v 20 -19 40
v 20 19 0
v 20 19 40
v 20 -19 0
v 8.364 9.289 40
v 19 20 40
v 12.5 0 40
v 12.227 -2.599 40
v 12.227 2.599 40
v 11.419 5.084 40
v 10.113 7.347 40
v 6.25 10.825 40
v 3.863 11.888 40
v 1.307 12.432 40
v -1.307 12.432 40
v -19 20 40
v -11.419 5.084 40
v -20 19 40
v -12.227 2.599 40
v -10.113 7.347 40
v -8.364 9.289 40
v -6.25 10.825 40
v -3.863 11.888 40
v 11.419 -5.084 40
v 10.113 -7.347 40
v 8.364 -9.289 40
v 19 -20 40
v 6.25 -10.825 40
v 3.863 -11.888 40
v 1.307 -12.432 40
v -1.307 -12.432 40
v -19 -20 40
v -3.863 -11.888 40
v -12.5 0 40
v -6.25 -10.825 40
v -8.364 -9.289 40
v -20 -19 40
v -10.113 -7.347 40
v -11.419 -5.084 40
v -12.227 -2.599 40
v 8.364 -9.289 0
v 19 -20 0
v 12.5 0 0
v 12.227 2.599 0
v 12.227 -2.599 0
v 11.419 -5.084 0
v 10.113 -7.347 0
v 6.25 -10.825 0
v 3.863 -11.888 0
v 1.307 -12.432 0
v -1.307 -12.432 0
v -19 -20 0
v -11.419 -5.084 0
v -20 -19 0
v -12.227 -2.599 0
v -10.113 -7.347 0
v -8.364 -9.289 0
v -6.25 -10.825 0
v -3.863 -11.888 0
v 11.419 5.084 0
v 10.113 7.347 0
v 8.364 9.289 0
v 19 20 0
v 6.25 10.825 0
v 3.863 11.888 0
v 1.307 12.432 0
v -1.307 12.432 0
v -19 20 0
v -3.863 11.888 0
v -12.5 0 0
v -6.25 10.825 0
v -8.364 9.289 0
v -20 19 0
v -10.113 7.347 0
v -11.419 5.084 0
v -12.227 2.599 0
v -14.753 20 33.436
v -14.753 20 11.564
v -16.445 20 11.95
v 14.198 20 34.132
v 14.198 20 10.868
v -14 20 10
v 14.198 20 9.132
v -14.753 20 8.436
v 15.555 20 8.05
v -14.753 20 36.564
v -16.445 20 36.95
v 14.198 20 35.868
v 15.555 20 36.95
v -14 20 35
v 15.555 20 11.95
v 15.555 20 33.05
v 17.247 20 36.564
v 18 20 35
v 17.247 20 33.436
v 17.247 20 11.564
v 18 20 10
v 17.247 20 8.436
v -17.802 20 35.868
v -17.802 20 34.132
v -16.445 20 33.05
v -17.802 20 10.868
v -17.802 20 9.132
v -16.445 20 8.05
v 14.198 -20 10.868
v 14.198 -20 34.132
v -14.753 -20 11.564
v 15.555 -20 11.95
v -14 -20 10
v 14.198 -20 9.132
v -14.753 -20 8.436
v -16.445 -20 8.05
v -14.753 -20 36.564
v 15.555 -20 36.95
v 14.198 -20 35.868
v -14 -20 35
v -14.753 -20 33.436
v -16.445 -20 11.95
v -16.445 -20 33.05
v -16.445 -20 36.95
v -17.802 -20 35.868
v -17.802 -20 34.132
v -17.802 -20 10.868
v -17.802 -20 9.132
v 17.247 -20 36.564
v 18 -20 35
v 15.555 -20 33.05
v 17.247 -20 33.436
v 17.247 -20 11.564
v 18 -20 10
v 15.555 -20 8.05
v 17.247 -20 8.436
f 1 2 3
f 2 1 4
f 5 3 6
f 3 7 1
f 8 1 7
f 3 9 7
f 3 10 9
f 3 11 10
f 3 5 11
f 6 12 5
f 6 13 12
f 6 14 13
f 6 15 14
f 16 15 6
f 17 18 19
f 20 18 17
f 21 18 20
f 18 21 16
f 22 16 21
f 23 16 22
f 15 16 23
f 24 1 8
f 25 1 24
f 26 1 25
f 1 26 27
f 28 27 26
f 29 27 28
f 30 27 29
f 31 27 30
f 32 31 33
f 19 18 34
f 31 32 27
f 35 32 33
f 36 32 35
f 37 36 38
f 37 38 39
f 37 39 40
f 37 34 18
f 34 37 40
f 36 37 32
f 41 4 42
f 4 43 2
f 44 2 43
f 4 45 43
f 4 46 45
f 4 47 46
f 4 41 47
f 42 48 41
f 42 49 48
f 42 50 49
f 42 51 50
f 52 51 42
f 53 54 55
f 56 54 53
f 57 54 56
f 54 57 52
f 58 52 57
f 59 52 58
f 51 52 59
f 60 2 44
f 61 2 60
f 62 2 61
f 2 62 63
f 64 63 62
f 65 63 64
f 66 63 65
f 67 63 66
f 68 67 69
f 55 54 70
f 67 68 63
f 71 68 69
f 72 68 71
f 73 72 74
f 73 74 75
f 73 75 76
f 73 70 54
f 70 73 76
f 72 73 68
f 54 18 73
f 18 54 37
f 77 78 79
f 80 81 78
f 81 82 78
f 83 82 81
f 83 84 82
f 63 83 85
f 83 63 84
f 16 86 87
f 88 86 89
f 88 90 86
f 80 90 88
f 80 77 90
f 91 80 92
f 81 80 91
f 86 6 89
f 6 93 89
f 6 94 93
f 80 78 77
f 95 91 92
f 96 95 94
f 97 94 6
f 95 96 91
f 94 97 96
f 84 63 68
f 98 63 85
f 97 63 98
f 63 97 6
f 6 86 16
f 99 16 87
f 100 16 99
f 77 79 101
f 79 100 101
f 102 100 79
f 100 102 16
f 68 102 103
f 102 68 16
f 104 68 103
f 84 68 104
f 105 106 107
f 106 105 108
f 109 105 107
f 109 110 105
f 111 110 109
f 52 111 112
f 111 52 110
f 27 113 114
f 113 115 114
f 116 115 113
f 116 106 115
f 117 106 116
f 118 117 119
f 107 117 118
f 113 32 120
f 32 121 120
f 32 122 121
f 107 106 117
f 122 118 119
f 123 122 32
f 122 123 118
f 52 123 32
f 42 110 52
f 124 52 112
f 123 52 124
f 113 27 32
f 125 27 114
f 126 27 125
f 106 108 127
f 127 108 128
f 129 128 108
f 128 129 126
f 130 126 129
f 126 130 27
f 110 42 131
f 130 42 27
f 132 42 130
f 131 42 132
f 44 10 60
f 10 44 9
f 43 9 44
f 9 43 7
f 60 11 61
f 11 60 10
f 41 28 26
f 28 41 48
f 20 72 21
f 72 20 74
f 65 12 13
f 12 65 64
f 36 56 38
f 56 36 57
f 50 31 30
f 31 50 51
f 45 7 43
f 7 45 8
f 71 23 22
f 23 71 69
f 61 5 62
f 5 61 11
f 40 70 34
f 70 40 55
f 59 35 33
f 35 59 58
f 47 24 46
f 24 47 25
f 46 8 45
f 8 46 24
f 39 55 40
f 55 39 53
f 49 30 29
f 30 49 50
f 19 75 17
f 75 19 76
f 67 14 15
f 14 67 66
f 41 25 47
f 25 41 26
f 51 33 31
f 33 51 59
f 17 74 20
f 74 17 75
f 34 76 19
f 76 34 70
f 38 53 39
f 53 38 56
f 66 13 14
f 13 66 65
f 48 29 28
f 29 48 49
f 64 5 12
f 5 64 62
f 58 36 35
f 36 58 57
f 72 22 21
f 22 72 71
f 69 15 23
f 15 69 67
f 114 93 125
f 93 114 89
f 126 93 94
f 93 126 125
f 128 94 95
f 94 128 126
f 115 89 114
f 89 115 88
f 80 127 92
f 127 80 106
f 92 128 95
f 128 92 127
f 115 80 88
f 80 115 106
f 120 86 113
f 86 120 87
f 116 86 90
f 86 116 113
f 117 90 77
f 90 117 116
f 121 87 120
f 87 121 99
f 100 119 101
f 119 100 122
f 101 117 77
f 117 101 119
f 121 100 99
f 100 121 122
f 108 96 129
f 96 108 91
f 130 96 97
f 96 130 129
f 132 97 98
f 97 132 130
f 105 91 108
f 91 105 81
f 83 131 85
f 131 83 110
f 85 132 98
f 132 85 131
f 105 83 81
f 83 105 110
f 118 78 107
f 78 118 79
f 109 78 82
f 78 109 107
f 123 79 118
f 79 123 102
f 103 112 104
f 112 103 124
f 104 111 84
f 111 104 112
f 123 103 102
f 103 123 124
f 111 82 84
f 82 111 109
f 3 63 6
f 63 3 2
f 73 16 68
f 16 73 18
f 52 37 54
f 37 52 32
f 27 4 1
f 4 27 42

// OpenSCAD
main_tube_diameter=25;
radius=main_tube_diameter/2;
wall_thickness=main_tube_diameter/(10/3);
width=main_tube_diameter+2*wall_thickness;	
depth=width;
height=width;


c_na_druhou=width*width+width*width;
uhlopricka=sqrt(c_na_druhou);

M4_screw_diameter=4;
mini_radius=M4_screw_diameter/2;
wall_thickness_mini_cylinder_X = mini_radius;
stred_mini_cylinder_X = width/2 - mini_radius - mini_radius;
stred_mini_cylinder_Z_horni = height - mini_radius - M4_screw_diameter*0.75;
stred_mini_cylinder_Z_dolni = mini_radius + M4_screw_diameter*2;

difference (){

translate([-(width/2),-(depth/2),0])
cube ([width,depth,height]);
	
	cylinder(h=height,r1=radius,r2=radius);


	translate([stred_mini_cylinder_X,depth/2,stred_mini_cylinder_Z_horni])
	rotate([90,0,0])
	cylinder(h=height,r1=mini_radius,r2=mini_radius);

	translate([-(stred_mini_cylinder_X),depth/2,stred_mini_cylinder_Z_horni])
	rotate([90,0,0])
	cylinder(h=height,r1=mini_radius,r2=mini_radius);

	translate([stred_mini_cylinder_X,depth/2,stred_mini_cylinder_Z_dolni])
	rotate([90,0,0])
	cylinder(h=height,r1=mini_radius,r2=mini_radius);

	translate([-(stred_mini_cylinder_X),depth/2,stred_mini_cylinder_Z_dolni])
	rotate([90,0,0])
	cylinder(h=height,r1=mini_radius,r2=mini_radius);


	translate([width/2,depth/2-1,0])
	rotate([0,0,45])
	cube([uhlopricka/2,uhlopricka/2,height]);

	translate([-(width/2),depth/2-1,0])
	rotate([0,0,45])
	cube([uhlopricka/2,uhlopricka/2,height]);

	translate([-(width/2),-(depth/2+uhlopricka/2-1),0])
	rotate([0,0,45])
	cube([width/2,depth/2,height]);

	translate([(width/2),-(depth/2+uhlopricka/2-1),0])
	rotate([0,0,45])
	cube([width/2,depth/2,height]);
}
